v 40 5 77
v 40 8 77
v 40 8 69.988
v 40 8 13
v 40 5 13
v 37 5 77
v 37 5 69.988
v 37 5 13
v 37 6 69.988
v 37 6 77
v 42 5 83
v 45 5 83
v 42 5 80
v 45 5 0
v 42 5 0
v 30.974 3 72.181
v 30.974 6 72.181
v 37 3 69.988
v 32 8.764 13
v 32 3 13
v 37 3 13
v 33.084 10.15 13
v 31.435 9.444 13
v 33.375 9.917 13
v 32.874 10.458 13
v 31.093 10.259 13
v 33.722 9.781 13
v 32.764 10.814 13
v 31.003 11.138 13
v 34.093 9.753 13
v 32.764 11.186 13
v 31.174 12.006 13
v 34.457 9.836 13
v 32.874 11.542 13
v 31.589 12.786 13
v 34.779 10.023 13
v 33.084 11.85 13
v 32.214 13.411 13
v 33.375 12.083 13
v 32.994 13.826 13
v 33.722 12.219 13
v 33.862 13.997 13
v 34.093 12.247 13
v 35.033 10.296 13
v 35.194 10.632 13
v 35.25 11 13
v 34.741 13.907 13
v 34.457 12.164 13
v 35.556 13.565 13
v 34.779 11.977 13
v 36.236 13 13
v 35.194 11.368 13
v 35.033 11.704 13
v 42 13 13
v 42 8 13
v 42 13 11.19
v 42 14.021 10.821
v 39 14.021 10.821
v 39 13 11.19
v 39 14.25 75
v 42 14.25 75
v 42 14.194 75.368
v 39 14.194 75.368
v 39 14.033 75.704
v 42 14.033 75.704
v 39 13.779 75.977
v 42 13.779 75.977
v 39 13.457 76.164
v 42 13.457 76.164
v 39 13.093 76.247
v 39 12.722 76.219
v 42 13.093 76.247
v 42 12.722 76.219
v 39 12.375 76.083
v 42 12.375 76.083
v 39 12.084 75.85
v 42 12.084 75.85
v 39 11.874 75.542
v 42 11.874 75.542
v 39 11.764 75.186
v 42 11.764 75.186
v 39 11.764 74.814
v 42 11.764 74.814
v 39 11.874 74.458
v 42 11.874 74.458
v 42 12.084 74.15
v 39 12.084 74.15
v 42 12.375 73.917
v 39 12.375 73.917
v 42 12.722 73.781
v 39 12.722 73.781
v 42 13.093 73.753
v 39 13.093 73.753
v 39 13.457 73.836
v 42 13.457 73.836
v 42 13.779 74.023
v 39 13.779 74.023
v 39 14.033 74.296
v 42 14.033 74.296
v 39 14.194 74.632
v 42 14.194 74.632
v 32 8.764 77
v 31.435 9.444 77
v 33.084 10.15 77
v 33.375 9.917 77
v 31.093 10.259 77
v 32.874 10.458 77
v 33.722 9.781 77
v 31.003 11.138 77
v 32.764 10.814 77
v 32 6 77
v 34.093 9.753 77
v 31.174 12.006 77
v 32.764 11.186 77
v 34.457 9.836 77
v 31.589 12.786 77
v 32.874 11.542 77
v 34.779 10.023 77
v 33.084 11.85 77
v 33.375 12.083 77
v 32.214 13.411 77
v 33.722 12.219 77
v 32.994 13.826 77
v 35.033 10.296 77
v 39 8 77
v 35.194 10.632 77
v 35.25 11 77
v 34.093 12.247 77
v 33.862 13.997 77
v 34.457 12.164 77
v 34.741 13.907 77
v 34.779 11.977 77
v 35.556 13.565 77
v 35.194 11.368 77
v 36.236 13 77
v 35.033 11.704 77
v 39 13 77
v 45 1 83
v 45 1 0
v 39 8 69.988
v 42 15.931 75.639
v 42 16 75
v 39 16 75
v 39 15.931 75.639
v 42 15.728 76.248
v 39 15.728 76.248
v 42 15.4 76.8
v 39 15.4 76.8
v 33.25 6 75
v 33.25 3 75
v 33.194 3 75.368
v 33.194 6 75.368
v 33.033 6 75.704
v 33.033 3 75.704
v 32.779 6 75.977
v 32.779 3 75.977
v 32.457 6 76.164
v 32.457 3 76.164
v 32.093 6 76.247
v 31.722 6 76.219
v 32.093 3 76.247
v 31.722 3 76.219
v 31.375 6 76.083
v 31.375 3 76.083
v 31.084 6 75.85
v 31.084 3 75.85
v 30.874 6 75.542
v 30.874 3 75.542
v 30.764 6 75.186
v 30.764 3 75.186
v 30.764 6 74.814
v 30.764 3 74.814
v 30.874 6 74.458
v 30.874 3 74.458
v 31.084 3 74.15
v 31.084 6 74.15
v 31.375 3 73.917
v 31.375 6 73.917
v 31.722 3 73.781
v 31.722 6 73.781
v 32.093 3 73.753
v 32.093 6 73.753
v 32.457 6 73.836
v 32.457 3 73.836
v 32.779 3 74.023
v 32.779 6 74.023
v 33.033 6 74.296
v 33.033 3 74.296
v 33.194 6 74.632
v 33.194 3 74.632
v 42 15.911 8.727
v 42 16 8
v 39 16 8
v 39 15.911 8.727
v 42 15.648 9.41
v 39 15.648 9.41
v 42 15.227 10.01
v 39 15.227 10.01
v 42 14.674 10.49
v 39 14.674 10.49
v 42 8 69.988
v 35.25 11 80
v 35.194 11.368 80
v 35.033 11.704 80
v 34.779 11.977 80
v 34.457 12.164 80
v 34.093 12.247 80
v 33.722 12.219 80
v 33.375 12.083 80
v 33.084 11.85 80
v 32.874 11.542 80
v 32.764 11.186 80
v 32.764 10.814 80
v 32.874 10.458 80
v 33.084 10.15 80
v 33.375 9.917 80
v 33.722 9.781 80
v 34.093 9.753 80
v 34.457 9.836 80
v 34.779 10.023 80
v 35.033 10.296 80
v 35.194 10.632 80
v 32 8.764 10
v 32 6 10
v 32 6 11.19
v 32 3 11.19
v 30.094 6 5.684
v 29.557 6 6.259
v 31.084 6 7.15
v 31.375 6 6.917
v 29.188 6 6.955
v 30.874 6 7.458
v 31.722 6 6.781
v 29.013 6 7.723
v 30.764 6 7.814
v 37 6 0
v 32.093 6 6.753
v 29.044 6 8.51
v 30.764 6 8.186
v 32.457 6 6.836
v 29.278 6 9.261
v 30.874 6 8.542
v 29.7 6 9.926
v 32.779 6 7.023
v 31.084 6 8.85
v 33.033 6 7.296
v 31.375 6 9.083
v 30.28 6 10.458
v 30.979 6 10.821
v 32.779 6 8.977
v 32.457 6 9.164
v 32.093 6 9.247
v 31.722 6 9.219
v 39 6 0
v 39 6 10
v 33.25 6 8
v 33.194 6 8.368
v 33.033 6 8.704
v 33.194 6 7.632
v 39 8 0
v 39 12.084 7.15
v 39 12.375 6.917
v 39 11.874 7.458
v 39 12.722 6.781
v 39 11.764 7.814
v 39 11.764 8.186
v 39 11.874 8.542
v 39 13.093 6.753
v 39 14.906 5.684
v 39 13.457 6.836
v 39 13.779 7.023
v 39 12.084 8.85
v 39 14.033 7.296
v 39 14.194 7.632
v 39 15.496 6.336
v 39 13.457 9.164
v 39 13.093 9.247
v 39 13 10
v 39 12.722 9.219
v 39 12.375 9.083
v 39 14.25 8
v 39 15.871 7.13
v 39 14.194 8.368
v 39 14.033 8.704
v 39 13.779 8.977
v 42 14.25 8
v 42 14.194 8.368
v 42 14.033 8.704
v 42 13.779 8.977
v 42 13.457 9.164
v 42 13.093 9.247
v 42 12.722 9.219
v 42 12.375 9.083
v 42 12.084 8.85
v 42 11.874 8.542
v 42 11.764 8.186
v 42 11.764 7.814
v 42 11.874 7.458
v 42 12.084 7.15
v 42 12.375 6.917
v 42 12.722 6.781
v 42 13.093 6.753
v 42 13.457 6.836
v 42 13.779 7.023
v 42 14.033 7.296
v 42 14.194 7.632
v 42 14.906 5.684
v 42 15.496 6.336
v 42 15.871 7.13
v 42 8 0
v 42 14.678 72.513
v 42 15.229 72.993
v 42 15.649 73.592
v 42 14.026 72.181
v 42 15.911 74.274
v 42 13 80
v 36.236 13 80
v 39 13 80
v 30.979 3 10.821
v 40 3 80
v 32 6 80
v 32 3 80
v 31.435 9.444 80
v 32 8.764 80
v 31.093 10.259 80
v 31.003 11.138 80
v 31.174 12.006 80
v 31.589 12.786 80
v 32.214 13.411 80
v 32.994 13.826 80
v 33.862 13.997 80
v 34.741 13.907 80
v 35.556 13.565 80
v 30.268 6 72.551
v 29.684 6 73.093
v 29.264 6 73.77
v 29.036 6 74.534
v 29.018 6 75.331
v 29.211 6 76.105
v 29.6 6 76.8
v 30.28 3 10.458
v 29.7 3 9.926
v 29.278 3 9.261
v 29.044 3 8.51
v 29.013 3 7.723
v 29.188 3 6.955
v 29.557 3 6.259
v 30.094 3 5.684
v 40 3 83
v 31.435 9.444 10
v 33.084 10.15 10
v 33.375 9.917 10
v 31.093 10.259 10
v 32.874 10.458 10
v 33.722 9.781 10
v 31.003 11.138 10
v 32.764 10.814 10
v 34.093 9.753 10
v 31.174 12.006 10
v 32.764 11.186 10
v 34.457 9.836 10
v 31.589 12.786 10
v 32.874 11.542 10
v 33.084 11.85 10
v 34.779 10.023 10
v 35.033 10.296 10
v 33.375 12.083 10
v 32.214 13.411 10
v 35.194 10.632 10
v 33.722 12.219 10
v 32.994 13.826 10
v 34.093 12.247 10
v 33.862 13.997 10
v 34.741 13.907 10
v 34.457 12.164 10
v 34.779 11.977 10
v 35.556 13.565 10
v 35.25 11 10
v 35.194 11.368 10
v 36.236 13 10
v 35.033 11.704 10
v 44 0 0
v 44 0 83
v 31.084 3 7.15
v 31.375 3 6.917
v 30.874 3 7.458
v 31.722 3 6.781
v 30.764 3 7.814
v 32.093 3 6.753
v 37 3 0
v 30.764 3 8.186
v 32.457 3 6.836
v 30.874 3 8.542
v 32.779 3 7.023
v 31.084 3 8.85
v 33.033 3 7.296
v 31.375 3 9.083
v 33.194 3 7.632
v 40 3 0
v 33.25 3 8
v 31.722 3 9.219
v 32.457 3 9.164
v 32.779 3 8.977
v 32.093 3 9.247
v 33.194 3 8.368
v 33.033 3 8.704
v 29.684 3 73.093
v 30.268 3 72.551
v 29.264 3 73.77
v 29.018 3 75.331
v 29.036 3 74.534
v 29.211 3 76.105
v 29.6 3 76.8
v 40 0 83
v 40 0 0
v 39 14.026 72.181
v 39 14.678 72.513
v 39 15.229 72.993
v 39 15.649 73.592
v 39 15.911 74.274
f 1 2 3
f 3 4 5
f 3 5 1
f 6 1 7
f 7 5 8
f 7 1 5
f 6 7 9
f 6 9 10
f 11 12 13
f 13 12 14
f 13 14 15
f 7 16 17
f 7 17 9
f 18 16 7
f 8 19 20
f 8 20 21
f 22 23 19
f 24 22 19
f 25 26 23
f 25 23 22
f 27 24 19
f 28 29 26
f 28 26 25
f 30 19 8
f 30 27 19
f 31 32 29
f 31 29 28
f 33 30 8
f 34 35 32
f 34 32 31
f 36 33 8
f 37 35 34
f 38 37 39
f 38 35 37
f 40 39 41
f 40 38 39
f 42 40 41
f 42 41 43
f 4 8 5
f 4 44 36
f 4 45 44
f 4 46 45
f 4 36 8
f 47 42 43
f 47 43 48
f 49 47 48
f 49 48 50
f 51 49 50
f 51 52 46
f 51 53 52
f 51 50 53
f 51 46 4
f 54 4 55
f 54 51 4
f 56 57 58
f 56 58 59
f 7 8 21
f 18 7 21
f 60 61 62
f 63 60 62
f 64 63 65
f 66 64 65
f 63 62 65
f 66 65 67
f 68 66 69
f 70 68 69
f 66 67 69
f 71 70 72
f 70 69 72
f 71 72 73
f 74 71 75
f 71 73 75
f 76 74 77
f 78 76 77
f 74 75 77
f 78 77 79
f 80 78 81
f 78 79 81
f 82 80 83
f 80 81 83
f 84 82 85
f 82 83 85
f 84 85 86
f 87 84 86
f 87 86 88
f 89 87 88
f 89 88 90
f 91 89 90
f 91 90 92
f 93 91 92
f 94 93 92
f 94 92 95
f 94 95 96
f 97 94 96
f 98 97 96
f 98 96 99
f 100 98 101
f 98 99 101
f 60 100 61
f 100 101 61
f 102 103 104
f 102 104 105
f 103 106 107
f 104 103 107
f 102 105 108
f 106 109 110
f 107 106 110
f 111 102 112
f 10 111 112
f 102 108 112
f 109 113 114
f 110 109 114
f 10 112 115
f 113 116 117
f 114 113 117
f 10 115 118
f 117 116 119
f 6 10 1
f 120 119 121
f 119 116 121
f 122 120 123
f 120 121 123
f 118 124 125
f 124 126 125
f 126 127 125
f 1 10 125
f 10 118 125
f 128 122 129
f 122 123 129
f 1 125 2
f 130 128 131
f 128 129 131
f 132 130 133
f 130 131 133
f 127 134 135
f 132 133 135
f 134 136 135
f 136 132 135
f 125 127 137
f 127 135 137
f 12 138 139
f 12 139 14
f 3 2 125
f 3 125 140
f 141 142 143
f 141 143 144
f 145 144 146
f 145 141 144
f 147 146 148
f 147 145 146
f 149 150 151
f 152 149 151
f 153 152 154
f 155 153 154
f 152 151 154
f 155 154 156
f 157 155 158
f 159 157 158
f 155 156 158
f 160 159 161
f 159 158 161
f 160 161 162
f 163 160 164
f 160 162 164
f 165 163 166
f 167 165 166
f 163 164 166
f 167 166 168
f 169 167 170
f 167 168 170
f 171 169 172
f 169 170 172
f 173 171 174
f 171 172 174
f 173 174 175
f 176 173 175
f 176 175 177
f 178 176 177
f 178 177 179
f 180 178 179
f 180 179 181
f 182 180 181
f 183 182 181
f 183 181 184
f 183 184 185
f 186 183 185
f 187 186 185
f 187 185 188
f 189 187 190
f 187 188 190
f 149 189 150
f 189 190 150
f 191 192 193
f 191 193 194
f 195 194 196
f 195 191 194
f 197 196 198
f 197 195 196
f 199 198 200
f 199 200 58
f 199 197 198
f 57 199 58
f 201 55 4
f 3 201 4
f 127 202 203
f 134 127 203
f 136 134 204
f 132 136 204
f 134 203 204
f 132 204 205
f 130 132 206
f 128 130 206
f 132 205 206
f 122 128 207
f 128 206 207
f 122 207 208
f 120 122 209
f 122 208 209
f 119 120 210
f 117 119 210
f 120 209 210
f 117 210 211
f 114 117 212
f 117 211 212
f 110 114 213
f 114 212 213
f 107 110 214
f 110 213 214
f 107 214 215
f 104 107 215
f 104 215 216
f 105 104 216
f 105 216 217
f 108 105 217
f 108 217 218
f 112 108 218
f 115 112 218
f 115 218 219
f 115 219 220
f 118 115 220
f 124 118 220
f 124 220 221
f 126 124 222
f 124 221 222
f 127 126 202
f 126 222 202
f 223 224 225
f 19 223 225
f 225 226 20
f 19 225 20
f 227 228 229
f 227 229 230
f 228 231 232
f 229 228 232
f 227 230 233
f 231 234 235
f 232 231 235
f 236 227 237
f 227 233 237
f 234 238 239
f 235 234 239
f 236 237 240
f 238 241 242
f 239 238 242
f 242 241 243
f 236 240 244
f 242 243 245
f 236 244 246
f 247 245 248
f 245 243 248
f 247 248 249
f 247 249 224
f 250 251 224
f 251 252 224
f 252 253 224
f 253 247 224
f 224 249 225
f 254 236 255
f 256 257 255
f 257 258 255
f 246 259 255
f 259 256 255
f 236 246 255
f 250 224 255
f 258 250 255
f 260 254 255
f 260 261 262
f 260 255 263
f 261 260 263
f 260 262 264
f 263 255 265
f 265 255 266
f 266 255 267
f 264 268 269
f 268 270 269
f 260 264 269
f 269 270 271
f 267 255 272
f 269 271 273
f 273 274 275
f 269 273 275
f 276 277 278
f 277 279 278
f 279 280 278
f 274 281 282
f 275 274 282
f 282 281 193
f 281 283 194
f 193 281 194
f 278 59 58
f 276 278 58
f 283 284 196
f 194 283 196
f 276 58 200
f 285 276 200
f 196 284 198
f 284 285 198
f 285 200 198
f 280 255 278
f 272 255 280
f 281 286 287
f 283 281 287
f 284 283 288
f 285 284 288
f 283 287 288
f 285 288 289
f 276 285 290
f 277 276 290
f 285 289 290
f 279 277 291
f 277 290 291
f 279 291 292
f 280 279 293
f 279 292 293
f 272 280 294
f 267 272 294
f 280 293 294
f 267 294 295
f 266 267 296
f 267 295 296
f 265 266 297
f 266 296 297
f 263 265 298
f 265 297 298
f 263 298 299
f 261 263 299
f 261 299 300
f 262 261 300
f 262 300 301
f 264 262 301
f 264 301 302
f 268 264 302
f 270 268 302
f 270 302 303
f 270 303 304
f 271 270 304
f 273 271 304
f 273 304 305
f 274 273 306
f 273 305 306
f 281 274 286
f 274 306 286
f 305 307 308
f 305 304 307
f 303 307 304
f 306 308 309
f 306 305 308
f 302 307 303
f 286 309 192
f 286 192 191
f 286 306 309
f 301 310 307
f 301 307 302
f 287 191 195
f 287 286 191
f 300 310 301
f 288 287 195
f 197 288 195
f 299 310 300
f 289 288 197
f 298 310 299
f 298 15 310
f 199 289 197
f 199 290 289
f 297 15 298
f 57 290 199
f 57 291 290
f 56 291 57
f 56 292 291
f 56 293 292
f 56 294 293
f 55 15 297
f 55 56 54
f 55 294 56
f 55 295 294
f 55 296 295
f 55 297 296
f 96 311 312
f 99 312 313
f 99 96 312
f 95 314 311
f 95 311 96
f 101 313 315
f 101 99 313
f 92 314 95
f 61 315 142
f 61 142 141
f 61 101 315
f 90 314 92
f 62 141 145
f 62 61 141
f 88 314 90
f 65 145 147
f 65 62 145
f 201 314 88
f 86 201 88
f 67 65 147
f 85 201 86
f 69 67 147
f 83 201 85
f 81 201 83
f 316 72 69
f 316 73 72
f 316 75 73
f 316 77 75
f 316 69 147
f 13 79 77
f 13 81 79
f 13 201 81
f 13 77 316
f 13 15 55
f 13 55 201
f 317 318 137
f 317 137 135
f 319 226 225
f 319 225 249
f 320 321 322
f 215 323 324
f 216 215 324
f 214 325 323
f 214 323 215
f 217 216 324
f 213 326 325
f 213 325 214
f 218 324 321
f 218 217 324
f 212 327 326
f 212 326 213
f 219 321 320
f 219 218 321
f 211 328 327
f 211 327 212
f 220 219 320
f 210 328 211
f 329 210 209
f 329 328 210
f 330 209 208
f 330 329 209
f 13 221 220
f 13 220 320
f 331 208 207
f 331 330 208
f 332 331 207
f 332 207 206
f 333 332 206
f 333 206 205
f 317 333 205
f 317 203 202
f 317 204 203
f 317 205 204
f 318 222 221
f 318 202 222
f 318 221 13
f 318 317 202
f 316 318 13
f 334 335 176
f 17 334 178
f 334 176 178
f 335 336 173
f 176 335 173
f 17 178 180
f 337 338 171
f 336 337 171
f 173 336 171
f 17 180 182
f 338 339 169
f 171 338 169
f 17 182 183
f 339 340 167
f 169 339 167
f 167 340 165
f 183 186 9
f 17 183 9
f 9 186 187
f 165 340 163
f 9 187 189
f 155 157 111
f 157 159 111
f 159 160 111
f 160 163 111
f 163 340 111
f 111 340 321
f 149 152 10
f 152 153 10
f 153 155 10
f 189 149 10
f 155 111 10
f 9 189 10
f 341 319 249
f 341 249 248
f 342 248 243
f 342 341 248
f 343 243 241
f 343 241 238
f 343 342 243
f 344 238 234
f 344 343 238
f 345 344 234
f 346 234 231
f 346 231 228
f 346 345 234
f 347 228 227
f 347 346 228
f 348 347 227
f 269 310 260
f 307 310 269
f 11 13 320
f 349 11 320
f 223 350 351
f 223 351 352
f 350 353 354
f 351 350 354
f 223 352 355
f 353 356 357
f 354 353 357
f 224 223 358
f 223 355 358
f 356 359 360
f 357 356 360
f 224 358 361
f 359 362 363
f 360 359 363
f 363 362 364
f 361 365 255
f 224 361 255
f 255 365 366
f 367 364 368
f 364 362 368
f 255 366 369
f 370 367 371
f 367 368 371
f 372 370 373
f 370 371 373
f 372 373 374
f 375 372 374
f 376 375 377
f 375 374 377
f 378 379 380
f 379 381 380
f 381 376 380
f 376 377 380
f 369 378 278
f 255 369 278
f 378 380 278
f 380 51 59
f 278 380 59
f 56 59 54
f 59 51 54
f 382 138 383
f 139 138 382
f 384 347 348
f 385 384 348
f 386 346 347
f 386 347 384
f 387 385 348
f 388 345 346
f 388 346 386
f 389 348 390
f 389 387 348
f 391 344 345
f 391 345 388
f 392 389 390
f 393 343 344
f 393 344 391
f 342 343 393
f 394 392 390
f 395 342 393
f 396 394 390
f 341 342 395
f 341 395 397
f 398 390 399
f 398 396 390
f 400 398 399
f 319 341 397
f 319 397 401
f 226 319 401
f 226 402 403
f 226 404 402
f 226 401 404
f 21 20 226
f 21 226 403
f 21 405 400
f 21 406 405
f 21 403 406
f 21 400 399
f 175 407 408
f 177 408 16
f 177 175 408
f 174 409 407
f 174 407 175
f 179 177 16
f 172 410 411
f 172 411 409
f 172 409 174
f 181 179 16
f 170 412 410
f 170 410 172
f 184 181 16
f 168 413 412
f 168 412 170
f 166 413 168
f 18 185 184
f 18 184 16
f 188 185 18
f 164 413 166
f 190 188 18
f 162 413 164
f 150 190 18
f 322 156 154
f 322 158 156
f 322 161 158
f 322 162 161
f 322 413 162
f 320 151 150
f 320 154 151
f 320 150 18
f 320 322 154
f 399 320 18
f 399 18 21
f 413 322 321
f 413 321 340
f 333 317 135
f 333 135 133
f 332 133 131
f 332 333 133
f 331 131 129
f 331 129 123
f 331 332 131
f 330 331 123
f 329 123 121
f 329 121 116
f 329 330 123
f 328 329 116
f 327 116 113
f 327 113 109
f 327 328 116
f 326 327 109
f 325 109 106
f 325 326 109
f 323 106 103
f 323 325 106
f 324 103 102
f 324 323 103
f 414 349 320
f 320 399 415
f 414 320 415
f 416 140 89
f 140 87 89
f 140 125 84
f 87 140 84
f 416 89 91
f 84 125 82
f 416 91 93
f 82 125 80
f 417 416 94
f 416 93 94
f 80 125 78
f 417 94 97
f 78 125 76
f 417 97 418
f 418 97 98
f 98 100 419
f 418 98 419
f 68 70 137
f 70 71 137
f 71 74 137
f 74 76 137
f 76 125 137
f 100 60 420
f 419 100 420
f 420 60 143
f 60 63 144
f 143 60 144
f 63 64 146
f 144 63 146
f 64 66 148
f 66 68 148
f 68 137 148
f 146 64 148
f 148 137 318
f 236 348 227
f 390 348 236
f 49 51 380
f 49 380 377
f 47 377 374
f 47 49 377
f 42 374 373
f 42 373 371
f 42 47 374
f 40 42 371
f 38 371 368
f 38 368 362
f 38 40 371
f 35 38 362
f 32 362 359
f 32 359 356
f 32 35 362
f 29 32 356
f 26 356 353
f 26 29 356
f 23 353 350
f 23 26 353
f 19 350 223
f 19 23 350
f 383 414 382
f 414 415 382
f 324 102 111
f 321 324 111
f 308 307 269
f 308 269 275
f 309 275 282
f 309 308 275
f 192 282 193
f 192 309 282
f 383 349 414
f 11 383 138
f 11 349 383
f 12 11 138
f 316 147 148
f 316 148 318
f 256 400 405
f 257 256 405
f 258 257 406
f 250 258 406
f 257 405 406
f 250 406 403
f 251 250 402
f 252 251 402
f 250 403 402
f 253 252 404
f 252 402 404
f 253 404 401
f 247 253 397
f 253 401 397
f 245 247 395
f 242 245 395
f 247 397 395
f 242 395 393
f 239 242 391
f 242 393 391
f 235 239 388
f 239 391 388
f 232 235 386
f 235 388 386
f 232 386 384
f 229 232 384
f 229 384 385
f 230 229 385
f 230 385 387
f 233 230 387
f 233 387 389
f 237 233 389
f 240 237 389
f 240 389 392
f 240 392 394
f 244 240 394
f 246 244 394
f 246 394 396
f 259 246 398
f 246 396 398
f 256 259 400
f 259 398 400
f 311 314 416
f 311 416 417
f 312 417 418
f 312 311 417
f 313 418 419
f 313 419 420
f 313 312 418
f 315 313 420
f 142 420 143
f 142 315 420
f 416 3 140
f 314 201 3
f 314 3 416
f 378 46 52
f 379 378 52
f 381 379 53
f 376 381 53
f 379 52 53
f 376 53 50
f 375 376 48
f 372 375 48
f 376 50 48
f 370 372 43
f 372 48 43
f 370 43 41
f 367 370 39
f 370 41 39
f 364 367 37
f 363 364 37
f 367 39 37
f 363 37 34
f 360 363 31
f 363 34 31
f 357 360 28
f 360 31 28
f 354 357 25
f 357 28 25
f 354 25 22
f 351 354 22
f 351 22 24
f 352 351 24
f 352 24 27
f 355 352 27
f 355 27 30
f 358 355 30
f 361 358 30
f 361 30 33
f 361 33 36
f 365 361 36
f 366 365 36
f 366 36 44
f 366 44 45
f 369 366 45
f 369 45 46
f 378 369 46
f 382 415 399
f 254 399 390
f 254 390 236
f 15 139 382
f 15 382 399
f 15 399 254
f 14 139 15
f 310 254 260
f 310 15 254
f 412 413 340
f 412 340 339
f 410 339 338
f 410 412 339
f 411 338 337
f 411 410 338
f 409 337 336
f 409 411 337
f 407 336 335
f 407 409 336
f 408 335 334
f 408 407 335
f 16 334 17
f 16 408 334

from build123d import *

# Parameters (mm, degrees)
F1_DEPTH  = 80
F2_R      = 1.25
F3_DEPTH  = 3
F4_DEPTH  = 3
F5_R      = 1.25
F6_DEPTH  = 3
F7_R      = 1.25
F8_DEPTH  = 3
F9_SIZE   = 1
F10_R     = 1.25
F10_W     = 3
F10_H     = 13
F11_DEPTH = 3
F12_W     = 3
F12_H     = 13
F12_R     = 1.25
F13_DEPTH = 3
F14_W     = 8
F14_H     = 3
F14_W_2   = 2
F15_DEPTH = 10
F17_DEPTH = 3
F16_R     = 1.25
F18_DEPTH = 25


with BuildPart() as f1:
    # F0 (on Top) → F1 (new body)
    with BuildSketch(Plane.XY):
        Polygon((40, 3), (40, 0), (45, 0), (45, 5), (42, 5), (42, 8), (40, 8), (40, 5), (37, 5), (37, 3), align=None)
    extrude(amount=F1_DEPTH)

    # F2 (on face) → F3 (join)
    with BuildSketch(Plane.XY.offset(80)):
        with BuildLine():
            Line((32, 3), (37, 3))
            Line((37, 3), (37, 5))
            Line((37, 5), (40, 5))
            Line((40, 5), (40, 8))
            Line((40, 8), (42, 8))
            Line((42, 8), (42, 13))
            Line((42, 13), (36.2360679775, 13))
            ThreePointArc((36.2360679775, 13), (36.8025170769, 12.0704662693), (37, 11))
            ThreePointArc((37, 11), (35.2247448714, 8.2613872125), (32, 8.7639320225))
            Line((32, 8.7639320225), (32, 3))
        make_face()
        with BuildLine():
            ThreePointArc((36.2360679775, 13), (31.8786796564, 13.1213203436), (32, 8.7639320225))
            ThreePointArc((32, 8.7639320225), (35.2247448714, 8.2613872125), (37, 11))
            ThreePointArc((37, 11), (36.8025170769, 12.0704662693), (36.2360679775, 13))
        make_face()
        with Locations((34, 11)):
            Circle(F2_R, mode=Mode.SUBTRACT)
    extrude(amount=-F3_DEPTH)

    # F2 (on face) → F4 (join)
    with BuildSketch(Plane.XY.offset(80)):
        Polygon((42, 5), (40, 3), (40, 0), (45, 0), (45, 5), align=None)
    extrude(amount=F4_DEPTH)

    # F5 (on face) → F6 (join)
    with BuildSketch(Plane.XZ.offset(-3)):
        with BuildLine():
            Line((32, 77), (32, 78))
            ThreePointArc((32, 78), (30.6583592135, 77.683281573), (29.6, 76.8))
            ThreePointArc((29.6, 76.8), (29.1245100257, 74.144688707), (30.97393957, 72.1809221376))
            ThreePointArc((30.97393957, 72.1809221376), (33.7207293091, 72.5425438671), (35, 75))
            ThreePointArc((35, 75), (34.8025170769, 76.0704662693), (34.2360679775, 77))
            Line((34.2360679775, 77), (32, 77))
        make_face()
        with Locations((32, 75)):
            Circle(F5_R, mode=Mode.SUBTRACT)
        with BuildLine():
            ThreePointArc((29.6, 76.8), (30.6583592135, 77.683281573), (32, 78))
            Line((32, 78), (32, 80))
            Line((32, 80), (29.6, 76.8))
        make_face()
        with BuildLine():
            Line((37, 77), (34.2360679775, 77))
            ThreePointArc((34.2360679775, 77), (34.8025170769, 76.0704662693), (35, 75))
            ThreePointArc((35, 75), (33.7207293091, 72.5425438671), (30.97393957, 72.1809221376))
            Line((30.97393957, 72.1809221376), (37, 69.9876155112))
            Line((37, 69.9876155112), (37, 77))
        make_face()
    extrude(amount=-F6_DEPTH)

    # F7 (on face) → F8 (join)
    with BuildSketch(Plane.YZ.offset(42)):
        with BuildLine():
            Line((8, 69.9876155112), (14.02606043, 72.1809221376))
            ThreePointArc((14.02606043, 72.1809221376), (10.5156676094, 73.3183066353), (10.7639320225, 77))
            Line((10.7639320225, 77), (8, 77))
            Line((8, 77), (8, 69.9876155112))
        make_face()
        with BuildLine():
            ThreePointArc((14.02606043, 72.1809221376), (15.4574561329, 73.2792706909), (16, 75))
            ThreePointArc((16, 75), (15.8460498942, 75.9486832981), (15.4, 76.8))
            ThreePointArc((15.4, 76.8), (14.3416407865, 77.683281573), (13, 78))
            Line((13, 78), (13, 77))
            Line((13, 77), (10.7639320225, 77))
            ThreePointArc((10.7639320225, 77), (10.5156676094, 73.3183066353), (14.02606043, 72.1809221376))
        make_face()
        with Locations((13, 75)):
            Circle(F7_R, mode=Mode.SUBTRACT)
        with BuildLine():
            ThreePointArc((13, 78), (14.3416407865, 77.683281573), (15.4, 76.8))
            Line((15.4, 76.8), (13, 80))
            Line((13, 80), (13, 78))
        make_face()
    extrude(amount=-F8_DEPTH)

    # F9
    f9_edges = [f1.edges().sort_by_distance(p)[0] for p in [
        (45, 0, 41.5),
    ]]
    chamfer(f9_edges, length=F9_SIZE)

    # F10 (on face) → F11 (join)
    with BuildSketch(Plane.XZ.offset(-3)):
        with BuildLine():
            ThreePointArc((30.0936794849, 5.6835496781), (33.2808275557, 5.2871637033), (35, 8))
            ThreePointArc((35, 8), (33.7229608507, 10.4558920796), (30.9790627288, 10.8209372712))
            ThreePointArc((30.9790627288, 10.8209372712), (29.0435836969, 8.5095121614), (30.0936794849, 5.6835496781))
        make_face()
        with Locations((32, 8)):
            Circle(F10_R, mode=Mode.SUBTRACT)
        with BuildLine():
            ThreePointArc((30.9790627288, 10.8209372712), (33.7229608507, 10.4558920796), (35, 8))
            ThreePointArc((35, 8), (33.2808275557, 5.2871637033), (30.0936794849, 5.6835496781))
            Line((30.0936794849, 5.6835496781), (37, 0))
            Line((37, 0), (37, 13))
            Line((37, 13), (30.9790627288, 10.8209372712))
        make_face()
        with Locations((38.5, 6.5)):
            Rectangle(F10_W, F10_H)
    extrude(amount=-F11_DEPTH)

    # F12 (on face) → F13 (join)
    with BuildSketch(Plane.YZ.offset(42)):
        with Locations((6.5, 6.5)):
            Rectangle(F12_W, F12_H)
        with BuildLine():
            ThreePointArc((14.9063205151, 5.6835496781), (10.0435836969, 7.4904878386), (14.0209372712, 10.8209372712))
            Line((14.0209372712, 10.8209372712), (8, 13))
            Line((8, 13), (8, 0))
            Line((8, 0), (14.9063205151, 5.6835496781))
        make_face()
        with BuildLine():
            ThreePointArc((14.9063205151, 5.6835496781), (15.7128362967, 6.7191724443), (16, 8))
            ThreePointArc((16, 8), (15.4558920796, 9.7229608507), (14.0209372712, 10.8209372712))
            ThreePointArc((14.0209372712, 10.8209372712), (10.0435836969, 7.4904878386), (14.9063205151, 5.6835496781))
        make_face()
        with Locations((13, 8)):
            Circle(F12_R, mode=Mode.SUBTRACT)
    extrude(amount=-F13_DEPTH)

    # F14 (on face) → F15 (join)
    with BuildSketch(Plane.XZ.offset(-3)):
        with Locations((36, 11.5)):
            Rectangle(F14_W, F14_H)
        with Locations((41, 11.5)):
            Rectangle(F14_W_2, F14_H)
    extrude(amount=-F15_DEPTH)

    # F16 (on face) → F17 (join)
    with BuildSketch(Plane.XY.offset(13)):
        with BuildLine():
            Line((32, 13), (36.2360679775, 13))
            ThreePointArc((36.2360679775, 13), (31.8786796564, 13.1213203436), (32, 8.7639320225))
            Line((32, 8.7639320225), (32, 13))
        make_face()
    extrude(amount=-F17_DEPTH)

    # F16 (on face) → F18 (cut)
    with BuildSketch(Plane.XY.offset(13)):
        with Locations((34, 11)):
            Circle(F16_R)
    extrude(amount=-F18_DEPTH, mode=Mode.SUBTRACT)


solid = f1.part
